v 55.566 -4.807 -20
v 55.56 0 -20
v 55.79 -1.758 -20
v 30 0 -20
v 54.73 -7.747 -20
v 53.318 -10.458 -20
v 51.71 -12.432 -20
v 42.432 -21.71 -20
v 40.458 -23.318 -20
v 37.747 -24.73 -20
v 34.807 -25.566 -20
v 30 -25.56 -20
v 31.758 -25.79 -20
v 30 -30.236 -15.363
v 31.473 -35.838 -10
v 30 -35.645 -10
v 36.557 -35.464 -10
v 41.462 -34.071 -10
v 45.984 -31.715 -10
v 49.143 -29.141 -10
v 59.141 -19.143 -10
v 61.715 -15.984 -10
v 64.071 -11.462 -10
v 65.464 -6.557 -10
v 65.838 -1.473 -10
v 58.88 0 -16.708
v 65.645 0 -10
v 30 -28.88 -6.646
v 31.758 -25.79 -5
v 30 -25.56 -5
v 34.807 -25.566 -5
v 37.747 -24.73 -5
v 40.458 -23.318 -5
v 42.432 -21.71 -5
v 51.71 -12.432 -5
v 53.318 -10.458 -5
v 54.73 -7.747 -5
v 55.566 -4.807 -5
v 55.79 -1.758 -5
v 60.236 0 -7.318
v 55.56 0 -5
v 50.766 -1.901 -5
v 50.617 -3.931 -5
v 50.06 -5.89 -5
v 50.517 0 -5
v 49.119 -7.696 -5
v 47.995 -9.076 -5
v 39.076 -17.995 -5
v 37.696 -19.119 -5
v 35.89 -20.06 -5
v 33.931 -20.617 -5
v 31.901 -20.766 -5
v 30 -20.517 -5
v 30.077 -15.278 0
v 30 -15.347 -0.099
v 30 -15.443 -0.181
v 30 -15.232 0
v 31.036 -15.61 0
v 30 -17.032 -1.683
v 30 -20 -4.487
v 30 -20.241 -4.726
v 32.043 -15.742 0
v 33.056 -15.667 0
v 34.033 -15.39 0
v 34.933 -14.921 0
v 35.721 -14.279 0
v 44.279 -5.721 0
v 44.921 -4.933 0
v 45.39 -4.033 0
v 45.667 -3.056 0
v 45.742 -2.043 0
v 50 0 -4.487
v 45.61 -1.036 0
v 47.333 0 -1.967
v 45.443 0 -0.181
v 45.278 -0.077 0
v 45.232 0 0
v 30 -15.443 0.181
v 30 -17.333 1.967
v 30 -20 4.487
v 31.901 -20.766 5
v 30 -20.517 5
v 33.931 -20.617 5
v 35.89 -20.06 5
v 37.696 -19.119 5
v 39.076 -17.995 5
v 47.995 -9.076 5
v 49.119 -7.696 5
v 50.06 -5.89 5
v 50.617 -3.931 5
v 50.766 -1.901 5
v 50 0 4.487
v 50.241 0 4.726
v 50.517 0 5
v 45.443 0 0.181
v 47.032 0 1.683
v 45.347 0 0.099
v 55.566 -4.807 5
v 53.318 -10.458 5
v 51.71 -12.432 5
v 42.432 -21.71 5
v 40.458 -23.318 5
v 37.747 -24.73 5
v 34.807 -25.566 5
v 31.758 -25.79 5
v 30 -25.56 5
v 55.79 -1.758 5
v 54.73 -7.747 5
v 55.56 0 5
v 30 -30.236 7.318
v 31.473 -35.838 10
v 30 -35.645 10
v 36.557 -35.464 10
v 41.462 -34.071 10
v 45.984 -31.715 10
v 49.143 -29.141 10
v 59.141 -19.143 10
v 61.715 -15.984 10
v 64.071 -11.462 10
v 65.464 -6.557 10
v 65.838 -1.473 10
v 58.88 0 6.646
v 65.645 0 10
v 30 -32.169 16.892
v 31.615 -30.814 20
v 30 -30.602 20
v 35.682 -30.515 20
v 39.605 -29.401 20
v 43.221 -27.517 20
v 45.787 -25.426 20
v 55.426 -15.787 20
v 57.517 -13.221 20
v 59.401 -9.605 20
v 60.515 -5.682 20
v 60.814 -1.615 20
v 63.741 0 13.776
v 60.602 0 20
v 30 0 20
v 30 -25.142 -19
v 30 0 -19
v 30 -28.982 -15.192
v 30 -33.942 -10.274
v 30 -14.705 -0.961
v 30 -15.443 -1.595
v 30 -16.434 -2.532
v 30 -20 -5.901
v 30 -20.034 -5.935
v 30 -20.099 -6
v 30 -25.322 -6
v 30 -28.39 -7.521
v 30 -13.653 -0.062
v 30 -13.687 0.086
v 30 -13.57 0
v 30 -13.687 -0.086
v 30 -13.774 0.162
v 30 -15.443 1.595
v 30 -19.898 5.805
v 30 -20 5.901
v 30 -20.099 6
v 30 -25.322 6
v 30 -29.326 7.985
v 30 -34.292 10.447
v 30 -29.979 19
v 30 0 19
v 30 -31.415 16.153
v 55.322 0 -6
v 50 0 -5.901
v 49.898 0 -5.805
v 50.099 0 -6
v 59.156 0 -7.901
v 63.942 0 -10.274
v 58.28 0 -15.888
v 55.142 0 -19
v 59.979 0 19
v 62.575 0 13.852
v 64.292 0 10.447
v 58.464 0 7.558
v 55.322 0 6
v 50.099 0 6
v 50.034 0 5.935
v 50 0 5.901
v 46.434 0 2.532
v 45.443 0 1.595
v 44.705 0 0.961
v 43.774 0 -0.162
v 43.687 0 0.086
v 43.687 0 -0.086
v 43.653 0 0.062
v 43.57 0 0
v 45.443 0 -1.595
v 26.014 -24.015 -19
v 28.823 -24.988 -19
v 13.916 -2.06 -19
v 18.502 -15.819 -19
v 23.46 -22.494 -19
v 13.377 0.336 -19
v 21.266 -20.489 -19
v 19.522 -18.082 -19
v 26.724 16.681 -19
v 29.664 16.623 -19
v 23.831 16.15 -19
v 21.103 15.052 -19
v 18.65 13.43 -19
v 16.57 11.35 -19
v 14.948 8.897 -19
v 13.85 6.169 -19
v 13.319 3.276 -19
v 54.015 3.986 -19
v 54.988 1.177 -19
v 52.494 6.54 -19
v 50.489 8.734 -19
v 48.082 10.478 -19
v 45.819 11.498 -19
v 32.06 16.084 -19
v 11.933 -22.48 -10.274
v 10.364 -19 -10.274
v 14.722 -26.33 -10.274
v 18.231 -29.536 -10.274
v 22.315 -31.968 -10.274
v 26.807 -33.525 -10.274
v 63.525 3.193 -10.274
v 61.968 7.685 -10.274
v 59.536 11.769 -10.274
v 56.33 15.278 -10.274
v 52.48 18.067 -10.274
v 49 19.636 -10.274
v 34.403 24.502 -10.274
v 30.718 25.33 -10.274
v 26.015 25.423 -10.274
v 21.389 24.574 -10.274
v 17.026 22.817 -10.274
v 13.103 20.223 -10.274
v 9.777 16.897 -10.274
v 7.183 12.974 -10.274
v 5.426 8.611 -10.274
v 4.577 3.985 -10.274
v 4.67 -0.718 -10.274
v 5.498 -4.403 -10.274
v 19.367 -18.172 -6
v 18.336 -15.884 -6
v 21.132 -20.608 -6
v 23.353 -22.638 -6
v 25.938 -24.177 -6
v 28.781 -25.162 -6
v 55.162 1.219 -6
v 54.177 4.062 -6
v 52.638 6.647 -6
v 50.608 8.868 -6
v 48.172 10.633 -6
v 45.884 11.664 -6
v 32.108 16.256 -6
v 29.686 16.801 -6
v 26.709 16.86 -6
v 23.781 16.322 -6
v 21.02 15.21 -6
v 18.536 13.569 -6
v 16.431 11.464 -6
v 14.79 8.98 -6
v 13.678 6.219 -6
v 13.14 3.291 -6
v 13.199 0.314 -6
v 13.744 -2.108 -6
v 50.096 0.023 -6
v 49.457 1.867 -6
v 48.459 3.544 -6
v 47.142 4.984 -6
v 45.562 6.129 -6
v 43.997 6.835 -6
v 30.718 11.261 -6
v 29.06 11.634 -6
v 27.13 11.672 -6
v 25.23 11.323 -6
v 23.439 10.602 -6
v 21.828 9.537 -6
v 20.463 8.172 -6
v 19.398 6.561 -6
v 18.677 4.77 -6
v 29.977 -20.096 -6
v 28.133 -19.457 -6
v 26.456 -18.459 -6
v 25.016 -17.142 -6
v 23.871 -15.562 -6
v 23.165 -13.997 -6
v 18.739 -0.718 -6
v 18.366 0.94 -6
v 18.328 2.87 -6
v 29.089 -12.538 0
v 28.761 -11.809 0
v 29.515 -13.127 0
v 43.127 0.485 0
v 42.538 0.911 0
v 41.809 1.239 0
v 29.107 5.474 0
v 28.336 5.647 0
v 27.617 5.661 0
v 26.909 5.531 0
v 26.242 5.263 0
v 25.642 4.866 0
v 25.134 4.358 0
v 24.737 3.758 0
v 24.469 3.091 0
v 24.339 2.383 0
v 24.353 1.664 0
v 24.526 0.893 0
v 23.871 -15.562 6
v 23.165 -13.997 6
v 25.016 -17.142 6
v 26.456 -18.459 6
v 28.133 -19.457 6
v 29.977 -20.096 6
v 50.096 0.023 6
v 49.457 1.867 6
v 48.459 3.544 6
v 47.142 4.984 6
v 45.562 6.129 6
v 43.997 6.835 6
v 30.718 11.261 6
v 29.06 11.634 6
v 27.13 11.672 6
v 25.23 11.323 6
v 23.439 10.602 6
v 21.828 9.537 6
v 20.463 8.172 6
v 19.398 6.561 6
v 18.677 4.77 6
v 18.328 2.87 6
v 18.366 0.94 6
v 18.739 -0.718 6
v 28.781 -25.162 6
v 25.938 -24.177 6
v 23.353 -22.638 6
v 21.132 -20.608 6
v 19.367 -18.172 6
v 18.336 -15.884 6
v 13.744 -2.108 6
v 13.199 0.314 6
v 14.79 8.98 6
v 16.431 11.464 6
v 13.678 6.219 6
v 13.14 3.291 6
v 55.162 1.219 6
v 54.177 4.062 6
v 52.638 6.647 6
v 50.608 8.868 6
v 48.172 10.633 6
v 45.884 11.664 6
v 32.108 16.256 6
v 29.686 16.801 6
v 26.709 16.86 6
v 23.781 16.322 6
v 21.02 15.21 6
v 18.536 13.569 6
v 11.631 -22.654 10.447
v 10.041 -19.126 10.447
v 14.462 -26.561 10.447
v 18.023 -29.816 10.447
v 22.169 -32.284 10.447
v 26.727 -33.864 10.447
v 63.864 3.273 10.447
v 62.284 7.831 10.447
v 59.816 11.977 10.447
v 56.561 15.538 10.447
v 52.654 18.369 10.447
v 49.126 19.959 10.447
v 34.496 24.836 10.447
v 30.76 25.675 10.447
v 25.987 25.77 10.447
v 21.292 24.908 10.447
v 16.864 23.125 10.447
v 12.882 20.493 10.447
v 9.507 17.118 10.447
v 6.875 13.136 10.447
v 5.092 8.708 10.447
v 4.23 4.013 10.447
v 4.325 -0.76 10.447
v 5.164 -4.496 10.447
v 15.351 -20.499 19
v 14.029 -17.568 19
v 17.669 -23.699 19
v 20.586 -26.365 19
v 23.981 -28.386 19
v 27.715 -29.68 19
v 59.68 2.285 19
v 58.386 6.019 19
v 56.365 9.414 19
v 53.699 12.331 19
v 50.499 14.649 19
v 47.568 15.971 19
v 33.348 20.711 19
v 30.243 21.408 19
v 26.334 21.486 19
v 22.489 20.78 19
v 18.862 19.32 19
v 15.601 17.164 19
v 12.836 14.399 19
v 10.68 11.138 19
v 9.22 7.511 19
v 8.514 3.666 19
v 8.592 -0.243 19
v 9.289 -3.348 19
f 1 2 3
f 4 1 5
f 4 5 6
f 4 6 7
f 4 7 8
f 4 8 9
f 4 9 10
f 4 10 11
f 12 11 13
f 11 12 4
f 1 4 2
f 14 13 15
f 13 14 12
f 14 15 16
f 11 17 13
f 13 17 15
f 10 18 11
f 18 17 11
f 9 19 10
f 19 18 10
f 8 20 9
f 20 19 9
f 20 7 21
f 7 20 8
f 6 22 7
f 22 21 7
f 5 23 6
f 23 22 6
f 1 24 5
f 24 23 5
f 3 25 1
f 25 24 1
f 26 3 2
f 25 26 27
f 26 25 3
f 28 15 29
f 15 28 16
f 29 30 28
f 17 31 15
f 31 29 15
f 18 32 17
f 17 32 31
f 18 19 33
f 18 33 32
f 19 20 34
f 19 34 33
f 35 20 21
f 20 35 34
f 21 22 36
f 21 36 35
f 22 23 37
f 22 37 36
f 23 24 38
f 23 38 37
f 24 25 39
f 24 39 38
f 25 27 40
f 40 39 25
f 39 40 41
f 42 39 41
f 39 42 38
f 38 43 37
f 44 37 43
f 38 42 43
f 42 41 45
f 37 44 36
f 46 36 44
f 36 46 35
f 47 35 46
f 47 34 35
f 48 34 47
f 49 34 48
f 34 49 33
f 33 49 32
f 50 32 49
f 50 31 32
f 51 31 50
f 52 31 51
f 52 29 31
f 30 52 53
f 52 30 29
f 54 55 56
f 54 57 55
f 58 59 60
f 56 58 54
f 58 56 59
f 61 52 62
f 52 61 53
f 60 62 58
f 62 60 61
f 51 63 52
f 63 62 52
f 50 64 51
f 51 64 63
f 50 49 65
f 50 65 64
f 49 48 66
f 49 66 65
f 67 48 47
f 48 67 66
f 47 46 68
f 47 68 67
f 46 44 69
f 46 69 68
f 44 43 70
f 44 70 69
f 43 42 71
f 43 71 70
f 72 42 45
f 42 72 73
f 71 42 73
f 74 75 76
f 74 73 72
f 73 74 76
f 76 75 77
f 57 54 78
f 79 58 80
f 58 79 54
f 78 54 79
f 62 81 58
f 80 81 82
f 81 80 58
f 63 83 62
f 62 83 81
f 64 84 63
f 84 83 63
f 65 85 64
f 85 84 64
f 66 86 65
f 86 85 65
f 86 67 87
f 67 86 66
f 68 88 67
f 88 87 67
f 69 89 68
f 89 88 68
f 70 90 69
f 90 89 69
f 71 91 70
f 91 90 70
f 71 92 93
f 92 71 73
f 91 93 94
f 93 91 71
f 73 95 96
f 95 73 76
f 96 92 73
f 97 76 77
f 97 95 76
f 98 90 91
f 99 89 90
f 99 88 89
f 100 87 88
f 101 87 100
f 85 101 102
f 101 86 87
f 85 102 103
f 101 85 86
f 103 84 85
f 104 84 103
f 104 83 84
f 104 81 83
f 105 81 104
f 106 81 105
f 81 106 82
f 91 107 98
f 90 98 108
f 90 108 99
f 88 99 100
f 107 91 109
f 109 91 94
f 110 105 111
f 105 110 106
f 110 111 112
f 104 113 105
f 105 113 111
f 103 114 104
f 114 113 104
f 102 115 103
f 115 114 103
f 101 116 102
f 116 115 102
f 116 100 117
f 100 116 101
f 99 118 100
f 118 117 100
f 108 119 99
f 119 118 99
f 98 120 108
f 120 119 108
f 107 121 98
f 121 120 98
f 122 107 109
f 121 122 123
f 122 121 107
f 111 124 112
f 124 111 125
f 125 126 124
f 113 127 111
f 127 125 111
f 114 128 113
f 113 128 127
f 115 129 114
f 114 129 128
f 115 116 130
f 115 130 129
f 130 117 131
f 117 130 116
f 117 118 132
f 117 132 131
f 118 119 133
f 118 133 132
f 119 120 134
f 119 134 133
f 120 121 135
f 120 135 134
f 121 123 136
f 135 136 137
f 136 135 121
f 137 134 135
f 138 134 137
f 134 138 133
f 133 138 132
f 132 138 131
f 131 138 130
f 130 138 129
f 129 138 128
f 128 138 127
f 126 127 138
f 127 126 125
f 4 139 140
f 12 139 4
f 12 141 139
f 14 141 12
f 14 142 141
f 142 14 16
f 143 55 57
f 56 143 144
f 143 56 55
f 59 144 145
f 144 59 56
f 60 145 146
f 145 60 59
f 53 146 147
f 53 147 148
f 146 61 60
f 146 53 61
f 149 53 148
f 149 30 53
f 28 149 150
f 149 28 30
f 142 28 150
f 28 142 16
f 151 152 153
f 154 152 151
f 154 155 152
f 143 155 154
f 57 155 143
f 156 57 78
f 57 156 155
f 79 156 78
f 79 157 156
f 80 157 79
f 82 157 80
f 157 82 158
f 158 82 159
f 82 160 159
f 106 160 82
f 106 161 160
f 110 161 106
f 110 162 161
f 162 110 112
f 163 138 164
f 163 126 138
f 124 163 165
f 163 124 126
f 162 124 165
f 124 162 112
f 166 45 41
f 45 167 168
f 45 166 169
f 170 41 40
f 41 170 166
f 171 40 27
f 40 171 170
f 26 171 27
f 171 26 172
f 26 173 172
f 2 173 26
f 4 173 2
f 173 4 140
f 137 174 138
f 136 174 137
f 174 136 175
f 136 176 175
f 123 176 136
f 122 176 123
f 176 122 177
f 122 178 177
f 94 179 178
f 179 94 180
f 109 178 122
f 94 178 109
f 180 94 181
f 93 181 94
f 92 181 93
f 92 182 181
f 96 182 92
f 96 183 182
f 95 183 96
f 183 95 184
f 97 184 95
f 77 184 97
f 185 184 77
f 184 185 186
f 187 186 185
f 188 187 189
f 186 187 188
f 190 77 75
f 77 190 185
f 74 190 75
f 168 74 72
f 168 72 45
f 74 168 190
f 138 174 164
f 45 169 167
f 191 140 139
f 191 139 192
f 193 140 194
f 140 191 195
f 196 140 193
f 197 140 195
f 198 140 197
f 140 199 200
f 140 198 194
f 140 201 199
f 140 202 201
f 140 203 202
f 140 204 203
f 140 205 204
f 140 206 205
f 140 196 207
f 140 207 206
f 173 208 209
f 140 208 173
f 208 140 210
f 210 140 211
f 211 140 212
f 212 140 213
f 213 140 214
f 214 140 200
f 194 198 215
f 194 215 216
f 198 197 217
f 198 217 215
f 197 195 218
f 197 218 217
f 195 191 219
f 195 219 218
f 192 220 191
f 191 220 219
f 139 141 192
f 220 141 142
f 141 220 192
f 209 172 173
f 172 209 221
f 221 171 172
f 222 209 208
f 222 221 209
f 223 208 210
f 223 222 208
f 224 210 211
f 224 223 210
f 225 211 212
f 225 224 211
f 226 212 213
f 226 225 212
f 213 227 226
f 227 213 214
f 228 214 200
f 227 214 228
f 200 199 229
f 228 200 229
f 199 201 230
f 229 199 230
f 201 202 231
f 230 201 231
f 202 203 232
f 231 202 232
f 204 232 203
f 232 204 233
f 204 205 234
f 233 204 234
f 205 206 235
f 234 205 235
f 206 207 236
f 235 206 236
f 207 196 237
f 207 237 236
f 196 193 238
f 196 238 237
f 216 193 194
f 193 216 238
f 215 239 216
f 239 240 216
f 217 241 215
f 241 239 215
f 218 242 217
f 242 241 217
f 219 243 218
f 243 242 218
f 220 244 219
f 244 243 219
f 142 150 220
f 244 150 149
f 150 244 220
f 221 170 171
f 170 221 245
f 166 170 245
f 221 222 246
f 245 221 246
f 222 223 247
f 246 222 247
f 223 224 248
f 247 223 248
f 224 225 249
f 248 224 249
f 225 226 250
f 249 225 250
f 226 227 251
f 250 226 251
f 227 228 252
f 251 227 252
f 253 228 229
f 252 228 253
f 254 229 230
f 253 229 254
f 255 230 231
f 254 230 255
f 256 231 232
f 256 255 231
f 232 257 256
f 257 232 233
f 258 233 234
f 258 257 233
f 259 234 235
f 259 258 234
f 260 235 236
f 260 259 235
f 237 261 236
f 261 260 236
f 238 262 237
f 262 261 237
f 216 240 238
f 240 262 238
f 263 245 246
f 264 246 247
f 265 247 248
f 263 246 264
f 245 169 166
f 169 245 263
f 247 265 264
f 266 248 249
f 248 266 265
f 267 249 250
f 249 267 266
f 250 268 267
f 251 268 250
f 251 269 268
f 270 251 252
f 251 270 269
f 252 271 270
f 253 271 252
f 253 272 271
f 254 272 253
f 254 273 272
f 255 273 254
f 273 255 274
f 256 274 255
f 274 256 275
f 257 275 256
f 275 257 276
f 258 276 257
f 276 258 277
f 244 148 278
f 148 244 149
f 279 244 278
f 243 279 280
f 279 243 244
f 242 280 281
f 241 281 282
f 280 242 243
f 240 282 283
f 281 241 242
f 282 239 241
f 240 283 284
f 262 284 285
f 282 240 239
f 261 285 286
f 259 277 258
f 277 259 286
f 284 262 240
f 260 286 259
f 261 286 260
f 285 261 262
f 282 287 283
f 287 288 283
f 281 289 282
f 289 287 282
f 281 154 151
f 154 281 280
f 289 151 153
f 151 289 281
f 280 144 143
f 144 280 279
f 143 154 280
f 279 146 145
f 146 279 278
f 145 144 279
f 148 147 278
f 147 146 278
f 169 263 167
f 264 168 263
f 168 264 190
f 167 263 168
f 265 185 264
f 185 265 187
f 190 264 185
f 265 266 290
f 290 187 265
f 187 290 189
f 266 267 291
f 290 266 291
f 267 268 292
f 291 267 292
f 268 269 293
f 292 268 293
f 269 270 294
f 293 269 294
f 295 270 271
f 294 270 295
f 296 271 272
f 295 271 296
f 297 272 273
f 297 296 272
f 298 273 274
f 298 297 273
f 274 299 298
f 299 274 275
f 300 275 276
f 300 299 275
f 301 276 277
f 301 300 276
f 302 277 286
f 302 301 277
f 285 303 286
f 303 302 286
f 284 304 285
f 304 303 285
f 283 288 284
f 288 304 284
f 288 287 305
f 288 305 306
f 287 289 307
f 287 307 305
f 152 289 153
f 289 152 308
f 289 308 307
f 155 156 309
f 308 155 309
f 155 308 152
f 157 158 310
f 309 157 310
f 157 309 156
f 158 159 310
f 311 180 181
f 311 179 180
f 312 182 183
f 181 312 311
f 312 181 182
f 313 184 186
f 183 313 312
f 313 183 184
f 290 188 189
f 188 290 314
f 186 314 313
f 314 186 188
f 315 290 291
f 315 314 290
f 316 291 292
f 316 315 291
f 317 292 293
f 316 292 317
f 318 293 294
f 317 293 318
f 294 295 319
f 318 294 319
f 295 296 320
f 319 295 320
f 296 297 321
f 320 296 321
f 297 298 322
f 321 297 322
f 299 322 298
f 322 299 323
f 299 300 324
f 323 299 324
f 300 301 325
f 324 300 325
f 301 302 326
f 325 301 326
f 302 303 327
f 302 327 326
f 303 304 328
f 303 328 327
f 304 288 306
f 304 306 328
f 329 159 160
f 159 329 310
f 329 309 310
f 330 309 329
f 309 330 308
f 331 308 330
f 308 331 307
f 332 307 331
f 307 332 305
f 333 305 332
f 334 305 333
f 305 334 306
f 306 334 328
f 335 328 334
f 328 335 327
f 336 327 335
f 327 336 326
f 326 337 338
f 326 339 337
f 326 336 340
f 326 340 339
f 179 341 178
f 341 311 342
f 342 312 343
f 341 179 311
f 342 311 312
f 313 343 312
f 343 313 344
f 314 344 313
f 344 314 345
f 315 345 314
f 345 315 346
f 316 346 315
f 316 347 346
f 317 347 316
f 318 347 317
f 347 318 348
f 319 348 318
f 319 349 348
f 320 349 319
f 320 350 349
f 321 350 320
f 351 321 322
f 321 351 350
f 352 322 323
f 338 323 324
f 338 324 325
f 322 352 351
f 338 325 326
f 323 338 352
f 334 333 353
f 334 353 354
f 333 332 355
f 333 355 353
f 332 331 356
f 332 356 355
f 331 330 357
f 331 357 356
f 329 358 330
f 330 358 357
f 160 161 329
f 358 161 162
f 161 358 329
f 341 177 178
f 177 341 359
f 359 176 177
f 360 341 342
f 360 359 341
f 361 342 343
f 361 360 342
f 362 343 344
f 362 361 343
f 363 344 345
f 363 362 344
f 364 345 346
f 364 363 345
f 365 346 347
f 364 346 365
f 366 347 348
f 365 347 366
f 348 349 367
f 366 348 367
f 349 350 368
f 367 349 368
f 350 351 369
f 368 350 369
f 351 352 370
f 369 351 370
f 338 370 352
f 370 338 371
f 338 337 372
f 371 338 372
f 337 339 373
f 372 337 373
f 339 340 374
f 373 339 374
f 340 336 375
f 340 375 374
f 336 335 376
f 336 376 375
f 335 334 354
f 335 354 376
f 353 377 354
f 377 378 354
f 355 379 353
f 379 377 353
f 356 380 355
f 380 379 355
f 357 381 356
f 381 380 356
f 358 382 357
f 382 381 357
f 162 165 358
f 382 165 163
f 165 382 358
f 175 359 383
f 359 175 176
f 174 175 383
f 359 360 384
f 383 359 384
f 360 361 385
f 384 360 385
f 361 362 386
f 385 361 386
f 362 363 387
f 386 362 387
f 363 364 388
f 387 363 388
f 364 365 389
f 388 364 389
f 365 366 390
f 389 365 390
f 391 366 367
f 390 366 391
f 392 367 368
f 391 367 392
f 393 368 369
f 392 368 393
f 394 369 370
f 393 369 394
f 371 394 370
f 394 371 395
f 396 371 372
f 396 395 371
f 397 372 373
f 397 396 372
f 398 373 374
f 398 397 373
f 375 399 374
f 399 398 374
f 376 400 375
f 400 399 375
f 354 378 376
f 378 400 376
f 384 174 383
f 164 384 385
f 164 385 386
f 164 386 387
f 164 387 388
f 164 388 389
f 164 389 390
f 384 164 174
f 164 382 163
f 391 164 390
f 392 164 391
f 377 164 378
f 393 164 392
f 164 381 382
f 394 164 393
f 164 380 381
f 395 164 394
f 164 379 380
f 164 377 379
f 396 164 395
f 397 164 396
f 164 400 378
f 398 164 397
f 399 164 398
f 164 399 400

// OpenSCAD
// file: ../lib/TOGComplexLib1.scad
function tcplx1_multiply(a, b) =
	[a[0]*b[0] - a[1]*b[1], a[0]*b[1] + a[1]*b[0]];
function tcplx1_divide(a, b) =
	let(bot = (b[0]*b[0] + b[1]*b[1]))
	[
		(a[0]*b[0] + a[1]*b[1])/bot,
		(a[1]*b[0] - a[0]*b[1])/bot
	];

assert([-11,23] == tcplx1_multiply([3,2], [1,7]));

assert([-1,3] == tcplx1_multiply([3,1], [0,1]));
assert([-1,3] == tcplx1_multiply([0,1], [3,1]));

echo(tcplx1_divide([-1,3], [3,1]));
assert([0,1] == tcplx1_divide([-1,3], [3,1]));

function tcplx1_normalize(vec) =
	let(veclen = sqrt(vec[0]*vec[0]+vec[1]*vec[1]))
	[vec[0] / veclen, vec[1] / veclen];

function tcplx1_relative_turnvec_vv(v0, v1) =
	tcplx1_divide(tcplx1_normalize(v1), tcplx1_normalize(v0));

function tcplx1_relative_turnvec_abc(p0, p1, p2) = tcplx1_relative_turnvec_vv(p1-p0, p2-p1);

// A 90-degree turn
assert([0,1] == tcplx1_relative_turnvec_abc([0,0], [1,0], [1,1]));
assert([0,1] == tcplx1_relative_turnvec_abc([0,0], [0,1], [-1,1]));

// A 45-degree turn
assert(tcplx1_normalize([1,1]) == tcplx1_relative_turnvec_abc([0,0], [1,0], [ 2,1]));
assert(tcplx1_normalize([1,1]) == tcplx1_relative_turnvec_abc([0,0], [0,1], [-1,2]));


function tcplx1_relative_angle_abc(p0, p1, p2) =
	let(turnvec = tcplx1_relative_turnvec_abc(p0, p1, p2))
	atan2(turnvec[1], turnvec[0]);

assert(-135 == tcplx1_relative_angle_abc([0,0], [1,0], [0,-1]));
assert( -90 == tcplx1_relative_angle_abc([0,0], [1,0], [1,-1]));
assert(   0 == tcplx1_relative_angle_abc([0,0], [1,0], [2, 0]));
assert(  90 == tcplx1_relative_angle_abc([0,0], [1,0], [1, 1]));
assert( 135 == tcplx1_relative_angle_abc([0,0], [1,0], [0, 1]));

assert(  90 == tcplx1_relative_angle_abc([1,1], [3,3], [1, 5]));
// file: ../lib/TOGVecLib0.scad
// Note: TOGMod1Constructors's togmod1__make_nd_vector_adder is used for similar purpose.

function togvec0_extend(vec, length, filler=0) = [
	for( i=[0 : 1 : length-1] ) len(vec) <= i ? filler : vec[i]
];

function togvec0_add_vec(a, b) =
	let( newlen = max(len(a), len(b)) )
	togvec0_extend(a, newlen) + togvec0_extend(b, newlen);

function togvec0_offset_points(points, offset, numtovec=function(n) [0,0,n] ) =
	let( offset_vec =
		is_list(offset) ? offset :
		is_num(offset) ? numtovec(offset) :
		assert(false, str("togvec0_offset_points: `offset` must be a List<Number> or Number; got: ", offset)) )
	[for(p=points) togvec0_add_vec(p, offset_vec)];
// file: ../lib/TOGMod1Constructors.scad
// TOGMod1Constructors-v1.11
// 
// Functions to construct objects understood by TOGMod1
// 
// v1.1:
// - Add togmod1_make_rounded_rect
// v1.2:
// - togmod1_make_rounded_rect can make ovals
// v1.3:
// - togmod1_circle_points, to just get the points of a circle
// - if pos parameter to circle function has a third element,
//   returned vertexes will include it as the z component;
// v1.3.1
// - Some assertions
// v1.4:
// - Refactor togmod1_rounded_rect_points and togmod1_circle_points
//   to use togmod1__make_nd_vector_adder for adapting to whatever
//   `pos` parameter is.
// v1.5:
// - togmod_rounded_rect_points will not simplify completely rounded sides
//   (where length of side is exactly twice the rounding radius)
//   unless simplify_rounded_sides=true
//   - This makes it more useful for polyhedron generation,
//     where radius varies, but number of points must remain constant.
// v1.6:
// - togmod1_make_rect makes a simple rectangle
// - togmod1_make_rounded_rect will defer to togmod1_make_rect when r=0
// v1.7:
// - togmod1_make_circle will return empty shape (["union"]) when d=0
// v1.8:
// - Add togmod1_text
// v1.9:
// - togmod1_circle_points uses 3 as minimum circle point count instead of 6
// v1.10:
// - Fix togmod1_linear_extrude_y so that range corresponds to Y start/end and
//   polygon X,Y correspond to X,Z.  Previously it was rotated wrongly,
//   which would have gone unnoticed for symmetrical shapes centered at 0,0.
// v1.11:
// - Remove an 'echo'

use <./TOGArrayLib1.scad>

function togmod1__make_nd_vector_adder(origin=[0,0]) =
	let(origin_is_zero = tal1_reduce(true, origin, function(prev,item) prev && item == 0))
	origin_is_zero ? (function(vec) len(vec) >= len(origin) ? vec : tal1_replace_at(origin, 0, vec)) :
	function(vec) [
		for(i=[0:1:max(len(origin),len(vec))-1]) (len(vec) > i ? vec[i] : 0) + (len(origin) > i ? origin[i] : 0),
	];

assert([1,2,3] == togmod1__make_nd_vector_adder()([1,2,3]));
assert([1,2,3] == togmod1__make_nd_vector_adder([0,0,3])([1,2]));


function togmod1_make_cuboid(size) =
	assert(is_list(size))
	assert(len(size) >= 3)
	assert(is_num(size[0]))
	assert(is_num(size[1]))
	assert(is_num(size[2]))
	["polyhedron-vf", [
		[-size[0]/2, -size[1]/2, -size[2]/2],
		[+size[0]/2, -size[1]/2, -size[2]/2],
		[-size[0]/2, +size[1]/2, -size[2]/2],
		[+size[0]/2, +size[1]/2, -size[2]/2],
		[-size[0]/2, -size[1]/2, +size[2]/2],
		[+size[0]/2, -size[1]/2, +size[2]/2],
		[-size[0]/2, +size[1]/2, +size[2]/2],
		[+size[0]/2, +size[1]/2, +size[2]/2]
	], [
		[0,1,3,2],[0,4,5,1],[4,6,7,5],[3,7,6,2],[1,5,7,3],[6,4,0,2]
	]];

function togmod1_make_polygon(verts) =
	["polygon-vp", verts, [[for( i=[0:1:len(verts)-1] ) i%len(verts)]]];

function togmod1_rounded_rect_points(size, r, pos=[0,0], simplify_rounded_sides=false) =
	assert(is_list(size))
	assert(len(size) >= 2)
	let(radii = is_list(r) ? r : is_num(r) ? [r,r] : assert(false, "rounded_rect r(adius) should be list<num> or num"))
	let(rx = radii[0])
	let(ry = radii[1])
	assert(is_num(rx))
	assert(is_num(ry))
	assert(size[0] >= 2*rx, str("size[0] must be >= 2*r[0]; size[0] = ",size[0],", 2*r[0] = ",2*rx))
	assert(size[1] >= 2*ry, str("size[1] must be >= 2*r[1]; size[1] = ",size[1],", 2*r[1] = ",2*ry))
	let(quarterfn=max($fn/4, 1))
	let(qfnx = simplify_rounded_sides && size[0] == 2*rx ? quarterfn-1 : quarterfn)
	let(qfny = simplify_rounded_sides && size[1] == 2*ry ? quarterfn-1 : quarterfn)
	let(finalizepos = togmod1__make_nd_vector_adder(pos))
[
	for(a=[0 : 1 : qfnx]) let(ang=      a*90/quarterfn) finalizepos([ size[0]/2-rx + rx*cos(ang),  size[1]/2-ry + ry*sin(ang)]),
	for(a=[0 : 1 : qfny]) let(ang= 90 + a*90/quarterfn) finalizepos([-size[0]/2+rx + rx*cos(ang),  size[1]/2-ry + ry*sin(ang)]),
	for(a=[0 : 1 : qfnx]) let(ang=180 + a*90/quarterfn) finalizepos([-size[0]/2+rx + rx*cos(ang), -size[1]/2+ry + ry*sin(ang)]),
	for(a=[0 : 1 : qfny]) let(ang=270 + a*90/quarterfn) finalizepos([ size[0]/2-rx + rx*cos(ang), -size[1]/2+ry + ry*sin(ang)]),
];

function togmod1_make_rect(size) =
	togmod1_make_polygon([
		[-size[0]/2, -size[1]/2],
		[+size[0]/2, -size[1]/2],
		[+size[0]/2, +size[1]/2],
		[-size[0]/2, +size[1]/2],
	]);

function togmod1_make_rounded_rect(size, r) =
	r == 0 ? togmod1_make_rect(size) :
	togmod1_make_polygon(togmod1_rounded_rect_points(size,r,simplify_rounded_sides=true));

/**
 * Returns points for an approximation of a circle where points are at distance r from pos.
 * Can be used to make other regular polygons, but the faces will be less than that
 * distance from pos (do some trig if you want face distance, e.g. for a hex nut).
 */
function togmod1_circle_points(r, pos=[0,0], d=undef) =
	assert( !is_undef(r) || !is_undef(d) )
	assert(!is_undef(pos[0]))
	assert(!is_undef(pos[1]))
	let(finalizepos = togmod1__make_nd_vector_adder(pos))
	let(r_ = !is_undef(r) ? r : d/2)
	let(fn = max($fn, 3))
	[for(i=[0 : 1 : fn-1]) finalizepos([r_*cos(i*360/fn), r_*sin(i*360/fn)])];

function togmod1_make_circle(r, pos=[0,0], d=undef) =
	r == 0 || d == 0 ? ["union"] :
	togmod1_make_polygon(togmod1_circle_points(r=r, pos=pos, d=d));

function togmod1_make_cylinder(d, zrange=[0,1], r=undef, pos=[0,0]) =
	assert( !is_undef(r) || !is_undef(d) )
	let( r_ = !is_undef(r) ? r : d/2 )
	// TODO: Make polyhedron directly
	["linear-extrude-zs", zrange, togmod1_make_circle(r=r_, pos=pos)];

function togmod1__is_range1d(range) = is_list(range) && len(range) == 2 && is_num(range[0]) && is_num(range[1]);

function togmod1_linear_extrude_z(range, shape) =
	assert(togmod1__is_range1d(range))
	["linear-extrude-zs", range, shape];
function togmod1_linear_extrude_x(range, shape) =
	assert(togmod1__is_range1d(range))
	["rotate", [90, 0, 90], togmod1_linear_extrude_z(range, shape)];
function togmod1_linear_extrude_y(range, shape) =
	assert(togmod1__is_range1d(range))
	["rotate", [90, 0,  0], togmod1_linear_extrude_z([-range[1], -range[0]], shape)];

function togmod1_text(text, size, font, halign, valign, spacing, direction, language, script) =
	["text-tsfhvsdls", text, size, font, halign, valign, spacing, direction, language, script];
// file: ../lib/TOGMod1.scad
// TOGMod1.9
// OpenSCAD library for representing shapes
// 
// See also: Functional OpenSCAD (https://github.com/thehans/FunctionalOpenSCAD)
// 
// v1.8:
// - Add `text-tsfhvsdls`
// v1.9
// - Add `offset-ds` (offset with _d_elta a _s_hape)

module togmod1_domodule(mod) {
	assert(is_list(mod));
	assert(len(mod) > 0);
	if( mod[0] == "polygon-vp" ) {
		// ["polygon-vp", vertexes, paths]
		polygon(points=mod[1], paths=mod[2]);
	} else if( mod[0] == "polyhedron-vf" ) {
		polyhedron(mod[1], faces=mod[2]);
	} else if( mod[0] == "scale" ) {
		assert(len(mod) == 3);
		scale(mod[1]) togmod1_domodule(mod[2]);
	} else if( mod[0] == "translate" ) {
		assert(len(mod) == 3);
		assert(is_list(mod[1]));
		for(c=mod[1]) assert(is_num(c), "translate component should be numeric");
		translate(mod[1]) togmod1_domodule(mod[2]);
	} else if( mod[0] == "rotate" ) {
		assert(len(mod) == 3);
		rotate(mod[1]) togmod1_domodule(mod[2]);
	} else if( mod[0] == "intersection" ) {
		intersection_for( i=[1:1:len(mod)-1] ) togmod1_domodule(mod[i]);
	} else if( mod[0] == "difference" ) {
		difference() {
			togmod1_domodule(mod[1]);
			for( i=[2:1:len(mod)-1] ) togmod1_domodule(mod[i]);
		}
	} else if( mod[0] == "union" ) {
		for( i=[1:1:len(mod)-1] ) togmod1_domodule(mod[i]);
	} else if( mod[0] == "hull" ) {
		hull() for( i=[1:1:len(mod)-1] ) togmod1_domodule(mod[i]);
	} else if( mod[0] == "offset-rs" ) {
		assert(len(mod) == 3);
		assert(is_num(mod[1]));
		assert(is_list(mod[2]));
		offset(mod[1]) togmod1_domodule(mod[2]);
	} else if( mod[0] == "linear-extrude-zs" ) {
		// ["linear-extrude-zs", [z0,z1], 2d_shape] // centered
		// ["linear-extrude-zs", height, 2d_shape]
		let( zrange = is_list(mod[1]) ? mod[1] : [-mod[1]/2, mod[1]/2] ) {
			translate([0,0,zrange[0]]) linear_extrude(zrange[1]-zrange[0]) togmod1_domodule(mod[2]);
		}
	} else if( mod[0] == "render" ) {
		render() togmod1_domodule(mod[1]);
	} else if( mod[0] == "minkowski" ) {
		minkowski() {
			togmod1_domodule(mod[1]);
			togmod1_domodule(mod[2]);
		}
	} else if( mod[0] == "x-debug" ) {
		# togmod1_domodule(mod[1]);
	} else if( mod[0] == "x-color" ) {
		color(mod[1]) togmod1_domodule(mod[2]);
	} else if( mod[0] == "text-tsfhvsdls" ) {
		text(text=mod[1], size=mod[2], font=mod[3], halign=mod[4], valign=mod[5], spacing=mod[6], direction=mod[7], language=mod[7], script=mod[8]);
	} else if( mod[0] == "offset-ds" ) {
		assert(is_num(mod[1]));
		assert(is_list(mod[2]));
		offset(delta=mod[1]) togmod1_domodule(mod[2]);
	} else {
		assert(false, str("Unrecognized shape: ", mod[0]));
	}
}
// file: ../lib/TOGArrayLib1.scad
// TOGArrayLib1.5
// 
// Functions for working with arrays.
// 
// v1.1:
// - tal1_reduce assert(is_list(items)) to prevent infinite recursion
//   when given undefined or other non-list values
// v1.1.1:
// - Fix tal1_uniq_remap_v2 to return "list-remap-result" as the
//   first element of the returned list
// v1.2:
// - Add tal1_replace_at function
// v1.3:
// - tal1_is_vec_of, tal1_is_vec_of_num
// v1.4:
// - tal1_assert_for_each, for when you want to assert something
//   about each of a list of items and get nice failure messages
// v1.5:
// - Add tal1_duplicate_reversed function, which may be
//   handy when generating symmetrical polygons and stuff.

/**
 * Make a list with the contents of list `a`,
 * but starting at offset `off`, replaced by the contents of list `b`.
 * len(result) = max(len(a), off+len(b))
 */
function tal1_replace_at(a, off, b, default_value=undef, default_value_function=undef) =
	assert(is_list(a))
	assert(is_list(b))
	let( _dvf = !is_undef(default_value_function) ? default_value_function : function(i) default_value )
[
	for( i=[0:1:min(off,len(a))-1] ) a[i],
	for( i=[len(a):1:off-1] ) _dvf(i),
	for( i=[off:1:off+len(b)-1] ) b[i-off],
	for( i=[off+len(b):1:len(a)-1] ) a[i],
];

// Simplest case
assert([] == tal1_replace_at([], 0, []));
// Second simplest cases
assert(["foo"] == tal1_replace_at(["foo"], 0, []));
assert(["foo"] == tal1_replace_at([], 0, ["foo"]));
// Replace one item
assert(["foo","quux","baz"] == tal1_replace_at(["foo","bar","baz"], 1, ["quux"]));
// Replace and extend
assert(["foo","quux","tuna","tina"] == tal1_replace_at(["foo","bar","baz"], 1, ["quux", "tuna", "tina"]));
// Add beyond end of `a`
assert(["foo","zzz","quux"] == tal1_replace_at(["foo"], 2, ["quux"], default_value="zzz"));
// Adding 'nothing' should still fill to that point with defaults
assert(["foo","zzz","zzz"] == tal1_replace_at(["foo"], 3, [], default_value="zzz"));


function tal1_reduce(start, items, func, offset=0) =
	assert(is_list(items))
	len(items) == offset ? start :
	tal1_reduce(func(start, items[offset]), items, func, offset+1);

function tal1_consecutive_duplicate_count(items) = tal1_reduce(
	[0, undef],
	items,
	function(z,item) [z[0] + (item == z[1] ? 1 : 0), item]
)[0];

assert(0 == tal1_consecutive_duplicate_count([]));
assert(0 == tal1_consecutive_duplicate_count([50]));
assert(1 == tal1_consecutive_duplicate_count([50,50]));
assert(0 == tal1_consecutive_duplicate_count([50,51,52,53]));
assert(1 == tal1_consecutive_duplicate_count([50,51,52,52]));
assert(3 == tal1_consecutive_duplicate_count([50,50,50,50]));

// Set test_size to arbirarily large values
// to ensure that OpenSCAD can handle heavy recursion
let(test_size=1000) assert(test_size/2 == tal1_consecutive_duplicate_count([for(i=[0:1:test_size-1]) floor(i/2)]));



function tal1_uniq_(items, off0, off1) =
	let(chunklen = off1-off0)
	chunklen == 0 ? [] :
	chunklen == 1 ? [items[off0]] :
	let(half=floor(chunklen/2))
	let(left  = tal1_uniq_(items, off0     , off0+half))
	let(right = tal1_uniq_(items, off0+half, off1     ))
	assert(len(left) > 0)
	assert(len(right) > 0)
	left[len(left)-1] == right[0] ? [each left, for(i=[1:1:len(right)-1]) right[i]] :
	[each left, each right];

/** Given a list of items, returns a new list with identical consecutive items merged */
function tal1_uniq(items) = tal1_uniq_(items, 0, len(items));

assert([] == tal1_uniq([]));
assert([123] == tal1_uniq([123]));
assert([55,0,1,2,3] == tal1_uniq([55,0,1,2,3]));
assert([55,0,1,2] == tal1_uniq([55,0,1,1,2]));
assert([55,0,1] == tal1_uniq([55,55,0,0,0,0,0,0,1,1,1,1]));
assert([55,0] == tal1_uniq([55,0,0,0,0,0,0,0]));



/**
 * Returns [new items, old index -> new index mapping].
 * No-op version.
 */
function tal1_uniq_remap_v1(items) =
	["list-remap-result", items, [for (vi=[0:1:len(items)-1]) vi]];

// [a, a, b, b, c, c]
//
// [a,    ...], []  -> [a],[0]
// [a, a, ...], [0] -> [a],[0,0]

assert([1,2,3] == [1,2,3]);

/**
 * Recursive version that will combine adjacent identical vertexes,
 * but will use the original items.
 */
function tal1_uniq_remap_v2(items, map=[]) =
	let(index = len(map))
	len(items) == index ? ["list-remap-result", items, map] :
	index == 0 ? tal1_uniq_remap_v2(items, [0]) :
	items[index] == items[map[index-1]] ? tal1_uniq_remap_v2(items, [for(vi=map) vi, map[index-1]]) :
	tal1_uniq_remap_v2(items, [for(vi=map) vi, index]);

assert(tal1_uniq_remap_v2([1,1,2,2,3,4]) == ["list-remap-result", [1,1,2,2,3,4], [0,0,2,2,4,5]]);


/**
 * Returns true if `vec` is a list of at least min_len items
 * and component_check(each item, even those beyond min_len) is true.
 */
function tal1_is_vec_of(vec, min_len=0, component_check=function(x) true) =
	assert(is_num(min_len) && min_len >= 0)
	assert(is_function(component_check))
	is_list(vec) && len(vec) >= min_len &&
	tal1_reduce(true, vec, function(prev,item) prev && component_check(item));

function tal1_is_vec_of_num(vec, min_len=0) = tal1_is_vec_of(vec, min_len, function(i) is_num(i));

assert( true == tal1_is_vec_of_num([1,2,3]));
assert( true == tal1_is_vec_of_num([]));
assert( true == tal1_is_vec_of_num([1,2,3], 3));
assert(false == tal1_is_vec_of_num([1,2], 3));
assert(false == tal1_is_vec_of_num([1,2,"spoon"], 3));
// Requirements are ambiguous when
// first min_len items are numbers, but there are non-numeric items afterwards,
// so let's error on the side of saying 'no, it's not a list of numbers';
// i.e. the item check and the min_len are independent.
assert(false == tal1_is_vec_of_num([1,2,3,"artichoke"], 3));


/**
 * Asserts that item_checker(each item in list, index of item)[0] is true.
 * Second element of item_checker return value is assertion message.
 * Returns the original list, in case that's useful to you.
 */
function tal1_assert_for_each(list, item_checker) =
	let( _ignored = [ for(i=[0:1:len(list)-1])
		let(q=item_checker(list[i],i))
		let(passed=is_bool(q) ? q : is_list(q) ? q[0] : assert(false, str(
			"tal1_assert_for_each: item_checker should return Bool|[Bool,String], but returned ",
			q, " for item at index ", i)))
		let(message=is_list(q) ? q[1] : undef)
		assert(passed, message)
		q
	])
	list;

// Callback can return a boolean...
assert([1,2,3] == tal1_assert_for_each([1,2,3], function(v,i) is_num(v)));
// ...or a [boolean, string]
assert([1,2,3] == tal1_assert_for_each([1,2,3], function(v,i) [is_num(v), "element be a num"]));

// [a, b, c] -> [a, b, c, rxf(c), rxf(b), rxf(a)]
function tal1_duplicate_reversed(list, rxf=function(item) item) =
	[
		each list,
		for( i=[len(list)-1 : -1 : 0] ) rxf(list[i]),
	];
// main file
// Idea:
// Automatically offset polyhedron faces in two dimensions
// by first calculating 

// Note: `use`d by ChunkBeam2.scad.
// Probably should be moved to its own library
// or maybe become part of TOGPolyhedronLib1.

offset = -1;
$fn = 32;

use <../lib/TOGArrayLib1.scad>
use <../lib/TOGMod1.scad>
use <../lib/TOGMod1Constructors.scad>
use <../lib/TOGPath1.scad>
use <../lib/TOGPolyhedronLib1.scad>
use <../lib/TOGVecLib0.scad>

// A profile is just the right side of a shape.
// This technique should work with whole polygons,
// too, but for the common case where making a polyhedron
// that is capped on the top and bottom (as opposed to being toroidal),
// you want to ignore the 'tunnel' at the center.

function aop0_offset_polypoints(points0, offset) =
	assert(is_num(offset))
	// Kind of a roundabot way to do this.
	// Could be done more directly without involving raths.
	let(rath = ["togpath1-rath",
		for( p=points0 ) ["togpath1-rathnode", p, ["offset", offset]]
	])
	assert(rath[0] == "togpath1-rath")
	togpath1_rath_to_polypoints(rath);

function aop0_polypoints_to_profile(points) = [
	for( i=[1:1:len(points)-2] ) points[i]
];

function aop0_profile_to_polypoints(prof) =
let( z=len(prof)-1 )
[
	[min(0, prof[0][0]-1), prof[0][1]],
	each prof,
	[min(0, prof[z][0]-1), prof[z][1]],
];

function aop0_profile_to_mirrored_polypoints(prof) = [
	for( i=[       0    :  1 : len(prof)-1] ) prof[i],
	for( i=[len(prof)-1 : -1 :      0     ] ) [-prof[i][0], prof[i][1]],
];

function aop0_offset_profile(profile, offset) =
	assert(is_num(offset))
	aop0_polypoints_to_profile(aop0_offset_polypoints(aop0_profile_to_polypoints(profile), offset=offset));

// Given a profile,
// return list of [x, y] offset_multiplier for each layer.
function aop0_calculate_layer_xz_offset_factors_from_polypoints( polypoints ) =
	let( offsetted = aop0_offset_polypoints(polypoints, 1) )
	[
		for( i = [0 : 1 : len(polypoints)-1] )
		let( p = polypoints[i] ) assert( tal1_is_vec_of_num(p, 2) )
		let( o =  offsetted[i] ) assert( tal1_is_vec_of_num(o, 2) )
		[o[0] - p[0], o[1]-p[1]]
	];

function aop0_calculate_layer_xz_offset_factors_from_profile( profile ) =
	aop0_polypoints_to_profile(aop0_calculate_layer_xz_offset_factors_from_polypoints(aop0_profile_to_polypoints(profile)));

function aop0_make_polyhedron_from_profile_rath( profile, rath, offset=0 ) =
	let( layer_xz_offset_factors = aop0_calculate_layer_xz_offset_factors_from_profile(profile) )
	let( params = [for( i=[0 : 1 : len(profile)-1] ) [profile[i], layer_xz_offset_factors[i]]] )
	tphl1_make_polyhedron_from_layer_function(params, function(param)
		let( pvec = param[0] )
		let( ofac = param[1] )
		togvec0_offset_points(
			togpath1_rath_to_polypoints(togpath1_offset_rath(rath, pvec[0] + ofac[0]*offset)),
			pvec[1] + ofac[1]*offset
		)
	);



demo_profile = [
	[10, -20],
	[20, -10],
	[10, - 5],
	[ 5, - 5],
	[ 0,   0],
	[ 5, + 5],
	[10, + 5],
	[20, +10],
	[15, +20],
];

demo_rath = ["togpath1-rath",
	["togpath1-rathnode", [  0, -20], ["round", 5]],
	["togpath1-rathnode", [ 20,   0], ["round", 5]],
	["togpath1-rathnode", [-10,  10], ["round", 5]],
];

cc_cube = ["translate", [30,-30,0], togmod1_make_cuboid([60,60,60])];

togmod1_domodule(["union",
	/*(["translate", [-30, 0, 0], ["union",
		togmod1_linear_extrude_z([ 0,10], togmod1_make_polygon(aop0_profile_to_mirrored_polypoints(aop0_offset_profile(demo_profile, offset=0     )))),
		togmod1_linear_extrude_z([10,20], togmod1_make_polygon(aop0_profile_to_mirrored_polypoints(aop0_offset_profile(demo_profile, offset=offset)))),
	]],*/
	
	["translate", [ 30, 0, 0], ["union",
		["intersection", aop0_make_polyhedron_from_profile_rath( demo_profile, demo_rath, offset=0      ), cc_cube],
		["difference"  , aop0_make_polyhedron_from_profile_rath( demo_profile, demo_rath, offset=offset ), cc_cube],
		// TODO: Cross-section showing original, un-offset
	]],
]);
